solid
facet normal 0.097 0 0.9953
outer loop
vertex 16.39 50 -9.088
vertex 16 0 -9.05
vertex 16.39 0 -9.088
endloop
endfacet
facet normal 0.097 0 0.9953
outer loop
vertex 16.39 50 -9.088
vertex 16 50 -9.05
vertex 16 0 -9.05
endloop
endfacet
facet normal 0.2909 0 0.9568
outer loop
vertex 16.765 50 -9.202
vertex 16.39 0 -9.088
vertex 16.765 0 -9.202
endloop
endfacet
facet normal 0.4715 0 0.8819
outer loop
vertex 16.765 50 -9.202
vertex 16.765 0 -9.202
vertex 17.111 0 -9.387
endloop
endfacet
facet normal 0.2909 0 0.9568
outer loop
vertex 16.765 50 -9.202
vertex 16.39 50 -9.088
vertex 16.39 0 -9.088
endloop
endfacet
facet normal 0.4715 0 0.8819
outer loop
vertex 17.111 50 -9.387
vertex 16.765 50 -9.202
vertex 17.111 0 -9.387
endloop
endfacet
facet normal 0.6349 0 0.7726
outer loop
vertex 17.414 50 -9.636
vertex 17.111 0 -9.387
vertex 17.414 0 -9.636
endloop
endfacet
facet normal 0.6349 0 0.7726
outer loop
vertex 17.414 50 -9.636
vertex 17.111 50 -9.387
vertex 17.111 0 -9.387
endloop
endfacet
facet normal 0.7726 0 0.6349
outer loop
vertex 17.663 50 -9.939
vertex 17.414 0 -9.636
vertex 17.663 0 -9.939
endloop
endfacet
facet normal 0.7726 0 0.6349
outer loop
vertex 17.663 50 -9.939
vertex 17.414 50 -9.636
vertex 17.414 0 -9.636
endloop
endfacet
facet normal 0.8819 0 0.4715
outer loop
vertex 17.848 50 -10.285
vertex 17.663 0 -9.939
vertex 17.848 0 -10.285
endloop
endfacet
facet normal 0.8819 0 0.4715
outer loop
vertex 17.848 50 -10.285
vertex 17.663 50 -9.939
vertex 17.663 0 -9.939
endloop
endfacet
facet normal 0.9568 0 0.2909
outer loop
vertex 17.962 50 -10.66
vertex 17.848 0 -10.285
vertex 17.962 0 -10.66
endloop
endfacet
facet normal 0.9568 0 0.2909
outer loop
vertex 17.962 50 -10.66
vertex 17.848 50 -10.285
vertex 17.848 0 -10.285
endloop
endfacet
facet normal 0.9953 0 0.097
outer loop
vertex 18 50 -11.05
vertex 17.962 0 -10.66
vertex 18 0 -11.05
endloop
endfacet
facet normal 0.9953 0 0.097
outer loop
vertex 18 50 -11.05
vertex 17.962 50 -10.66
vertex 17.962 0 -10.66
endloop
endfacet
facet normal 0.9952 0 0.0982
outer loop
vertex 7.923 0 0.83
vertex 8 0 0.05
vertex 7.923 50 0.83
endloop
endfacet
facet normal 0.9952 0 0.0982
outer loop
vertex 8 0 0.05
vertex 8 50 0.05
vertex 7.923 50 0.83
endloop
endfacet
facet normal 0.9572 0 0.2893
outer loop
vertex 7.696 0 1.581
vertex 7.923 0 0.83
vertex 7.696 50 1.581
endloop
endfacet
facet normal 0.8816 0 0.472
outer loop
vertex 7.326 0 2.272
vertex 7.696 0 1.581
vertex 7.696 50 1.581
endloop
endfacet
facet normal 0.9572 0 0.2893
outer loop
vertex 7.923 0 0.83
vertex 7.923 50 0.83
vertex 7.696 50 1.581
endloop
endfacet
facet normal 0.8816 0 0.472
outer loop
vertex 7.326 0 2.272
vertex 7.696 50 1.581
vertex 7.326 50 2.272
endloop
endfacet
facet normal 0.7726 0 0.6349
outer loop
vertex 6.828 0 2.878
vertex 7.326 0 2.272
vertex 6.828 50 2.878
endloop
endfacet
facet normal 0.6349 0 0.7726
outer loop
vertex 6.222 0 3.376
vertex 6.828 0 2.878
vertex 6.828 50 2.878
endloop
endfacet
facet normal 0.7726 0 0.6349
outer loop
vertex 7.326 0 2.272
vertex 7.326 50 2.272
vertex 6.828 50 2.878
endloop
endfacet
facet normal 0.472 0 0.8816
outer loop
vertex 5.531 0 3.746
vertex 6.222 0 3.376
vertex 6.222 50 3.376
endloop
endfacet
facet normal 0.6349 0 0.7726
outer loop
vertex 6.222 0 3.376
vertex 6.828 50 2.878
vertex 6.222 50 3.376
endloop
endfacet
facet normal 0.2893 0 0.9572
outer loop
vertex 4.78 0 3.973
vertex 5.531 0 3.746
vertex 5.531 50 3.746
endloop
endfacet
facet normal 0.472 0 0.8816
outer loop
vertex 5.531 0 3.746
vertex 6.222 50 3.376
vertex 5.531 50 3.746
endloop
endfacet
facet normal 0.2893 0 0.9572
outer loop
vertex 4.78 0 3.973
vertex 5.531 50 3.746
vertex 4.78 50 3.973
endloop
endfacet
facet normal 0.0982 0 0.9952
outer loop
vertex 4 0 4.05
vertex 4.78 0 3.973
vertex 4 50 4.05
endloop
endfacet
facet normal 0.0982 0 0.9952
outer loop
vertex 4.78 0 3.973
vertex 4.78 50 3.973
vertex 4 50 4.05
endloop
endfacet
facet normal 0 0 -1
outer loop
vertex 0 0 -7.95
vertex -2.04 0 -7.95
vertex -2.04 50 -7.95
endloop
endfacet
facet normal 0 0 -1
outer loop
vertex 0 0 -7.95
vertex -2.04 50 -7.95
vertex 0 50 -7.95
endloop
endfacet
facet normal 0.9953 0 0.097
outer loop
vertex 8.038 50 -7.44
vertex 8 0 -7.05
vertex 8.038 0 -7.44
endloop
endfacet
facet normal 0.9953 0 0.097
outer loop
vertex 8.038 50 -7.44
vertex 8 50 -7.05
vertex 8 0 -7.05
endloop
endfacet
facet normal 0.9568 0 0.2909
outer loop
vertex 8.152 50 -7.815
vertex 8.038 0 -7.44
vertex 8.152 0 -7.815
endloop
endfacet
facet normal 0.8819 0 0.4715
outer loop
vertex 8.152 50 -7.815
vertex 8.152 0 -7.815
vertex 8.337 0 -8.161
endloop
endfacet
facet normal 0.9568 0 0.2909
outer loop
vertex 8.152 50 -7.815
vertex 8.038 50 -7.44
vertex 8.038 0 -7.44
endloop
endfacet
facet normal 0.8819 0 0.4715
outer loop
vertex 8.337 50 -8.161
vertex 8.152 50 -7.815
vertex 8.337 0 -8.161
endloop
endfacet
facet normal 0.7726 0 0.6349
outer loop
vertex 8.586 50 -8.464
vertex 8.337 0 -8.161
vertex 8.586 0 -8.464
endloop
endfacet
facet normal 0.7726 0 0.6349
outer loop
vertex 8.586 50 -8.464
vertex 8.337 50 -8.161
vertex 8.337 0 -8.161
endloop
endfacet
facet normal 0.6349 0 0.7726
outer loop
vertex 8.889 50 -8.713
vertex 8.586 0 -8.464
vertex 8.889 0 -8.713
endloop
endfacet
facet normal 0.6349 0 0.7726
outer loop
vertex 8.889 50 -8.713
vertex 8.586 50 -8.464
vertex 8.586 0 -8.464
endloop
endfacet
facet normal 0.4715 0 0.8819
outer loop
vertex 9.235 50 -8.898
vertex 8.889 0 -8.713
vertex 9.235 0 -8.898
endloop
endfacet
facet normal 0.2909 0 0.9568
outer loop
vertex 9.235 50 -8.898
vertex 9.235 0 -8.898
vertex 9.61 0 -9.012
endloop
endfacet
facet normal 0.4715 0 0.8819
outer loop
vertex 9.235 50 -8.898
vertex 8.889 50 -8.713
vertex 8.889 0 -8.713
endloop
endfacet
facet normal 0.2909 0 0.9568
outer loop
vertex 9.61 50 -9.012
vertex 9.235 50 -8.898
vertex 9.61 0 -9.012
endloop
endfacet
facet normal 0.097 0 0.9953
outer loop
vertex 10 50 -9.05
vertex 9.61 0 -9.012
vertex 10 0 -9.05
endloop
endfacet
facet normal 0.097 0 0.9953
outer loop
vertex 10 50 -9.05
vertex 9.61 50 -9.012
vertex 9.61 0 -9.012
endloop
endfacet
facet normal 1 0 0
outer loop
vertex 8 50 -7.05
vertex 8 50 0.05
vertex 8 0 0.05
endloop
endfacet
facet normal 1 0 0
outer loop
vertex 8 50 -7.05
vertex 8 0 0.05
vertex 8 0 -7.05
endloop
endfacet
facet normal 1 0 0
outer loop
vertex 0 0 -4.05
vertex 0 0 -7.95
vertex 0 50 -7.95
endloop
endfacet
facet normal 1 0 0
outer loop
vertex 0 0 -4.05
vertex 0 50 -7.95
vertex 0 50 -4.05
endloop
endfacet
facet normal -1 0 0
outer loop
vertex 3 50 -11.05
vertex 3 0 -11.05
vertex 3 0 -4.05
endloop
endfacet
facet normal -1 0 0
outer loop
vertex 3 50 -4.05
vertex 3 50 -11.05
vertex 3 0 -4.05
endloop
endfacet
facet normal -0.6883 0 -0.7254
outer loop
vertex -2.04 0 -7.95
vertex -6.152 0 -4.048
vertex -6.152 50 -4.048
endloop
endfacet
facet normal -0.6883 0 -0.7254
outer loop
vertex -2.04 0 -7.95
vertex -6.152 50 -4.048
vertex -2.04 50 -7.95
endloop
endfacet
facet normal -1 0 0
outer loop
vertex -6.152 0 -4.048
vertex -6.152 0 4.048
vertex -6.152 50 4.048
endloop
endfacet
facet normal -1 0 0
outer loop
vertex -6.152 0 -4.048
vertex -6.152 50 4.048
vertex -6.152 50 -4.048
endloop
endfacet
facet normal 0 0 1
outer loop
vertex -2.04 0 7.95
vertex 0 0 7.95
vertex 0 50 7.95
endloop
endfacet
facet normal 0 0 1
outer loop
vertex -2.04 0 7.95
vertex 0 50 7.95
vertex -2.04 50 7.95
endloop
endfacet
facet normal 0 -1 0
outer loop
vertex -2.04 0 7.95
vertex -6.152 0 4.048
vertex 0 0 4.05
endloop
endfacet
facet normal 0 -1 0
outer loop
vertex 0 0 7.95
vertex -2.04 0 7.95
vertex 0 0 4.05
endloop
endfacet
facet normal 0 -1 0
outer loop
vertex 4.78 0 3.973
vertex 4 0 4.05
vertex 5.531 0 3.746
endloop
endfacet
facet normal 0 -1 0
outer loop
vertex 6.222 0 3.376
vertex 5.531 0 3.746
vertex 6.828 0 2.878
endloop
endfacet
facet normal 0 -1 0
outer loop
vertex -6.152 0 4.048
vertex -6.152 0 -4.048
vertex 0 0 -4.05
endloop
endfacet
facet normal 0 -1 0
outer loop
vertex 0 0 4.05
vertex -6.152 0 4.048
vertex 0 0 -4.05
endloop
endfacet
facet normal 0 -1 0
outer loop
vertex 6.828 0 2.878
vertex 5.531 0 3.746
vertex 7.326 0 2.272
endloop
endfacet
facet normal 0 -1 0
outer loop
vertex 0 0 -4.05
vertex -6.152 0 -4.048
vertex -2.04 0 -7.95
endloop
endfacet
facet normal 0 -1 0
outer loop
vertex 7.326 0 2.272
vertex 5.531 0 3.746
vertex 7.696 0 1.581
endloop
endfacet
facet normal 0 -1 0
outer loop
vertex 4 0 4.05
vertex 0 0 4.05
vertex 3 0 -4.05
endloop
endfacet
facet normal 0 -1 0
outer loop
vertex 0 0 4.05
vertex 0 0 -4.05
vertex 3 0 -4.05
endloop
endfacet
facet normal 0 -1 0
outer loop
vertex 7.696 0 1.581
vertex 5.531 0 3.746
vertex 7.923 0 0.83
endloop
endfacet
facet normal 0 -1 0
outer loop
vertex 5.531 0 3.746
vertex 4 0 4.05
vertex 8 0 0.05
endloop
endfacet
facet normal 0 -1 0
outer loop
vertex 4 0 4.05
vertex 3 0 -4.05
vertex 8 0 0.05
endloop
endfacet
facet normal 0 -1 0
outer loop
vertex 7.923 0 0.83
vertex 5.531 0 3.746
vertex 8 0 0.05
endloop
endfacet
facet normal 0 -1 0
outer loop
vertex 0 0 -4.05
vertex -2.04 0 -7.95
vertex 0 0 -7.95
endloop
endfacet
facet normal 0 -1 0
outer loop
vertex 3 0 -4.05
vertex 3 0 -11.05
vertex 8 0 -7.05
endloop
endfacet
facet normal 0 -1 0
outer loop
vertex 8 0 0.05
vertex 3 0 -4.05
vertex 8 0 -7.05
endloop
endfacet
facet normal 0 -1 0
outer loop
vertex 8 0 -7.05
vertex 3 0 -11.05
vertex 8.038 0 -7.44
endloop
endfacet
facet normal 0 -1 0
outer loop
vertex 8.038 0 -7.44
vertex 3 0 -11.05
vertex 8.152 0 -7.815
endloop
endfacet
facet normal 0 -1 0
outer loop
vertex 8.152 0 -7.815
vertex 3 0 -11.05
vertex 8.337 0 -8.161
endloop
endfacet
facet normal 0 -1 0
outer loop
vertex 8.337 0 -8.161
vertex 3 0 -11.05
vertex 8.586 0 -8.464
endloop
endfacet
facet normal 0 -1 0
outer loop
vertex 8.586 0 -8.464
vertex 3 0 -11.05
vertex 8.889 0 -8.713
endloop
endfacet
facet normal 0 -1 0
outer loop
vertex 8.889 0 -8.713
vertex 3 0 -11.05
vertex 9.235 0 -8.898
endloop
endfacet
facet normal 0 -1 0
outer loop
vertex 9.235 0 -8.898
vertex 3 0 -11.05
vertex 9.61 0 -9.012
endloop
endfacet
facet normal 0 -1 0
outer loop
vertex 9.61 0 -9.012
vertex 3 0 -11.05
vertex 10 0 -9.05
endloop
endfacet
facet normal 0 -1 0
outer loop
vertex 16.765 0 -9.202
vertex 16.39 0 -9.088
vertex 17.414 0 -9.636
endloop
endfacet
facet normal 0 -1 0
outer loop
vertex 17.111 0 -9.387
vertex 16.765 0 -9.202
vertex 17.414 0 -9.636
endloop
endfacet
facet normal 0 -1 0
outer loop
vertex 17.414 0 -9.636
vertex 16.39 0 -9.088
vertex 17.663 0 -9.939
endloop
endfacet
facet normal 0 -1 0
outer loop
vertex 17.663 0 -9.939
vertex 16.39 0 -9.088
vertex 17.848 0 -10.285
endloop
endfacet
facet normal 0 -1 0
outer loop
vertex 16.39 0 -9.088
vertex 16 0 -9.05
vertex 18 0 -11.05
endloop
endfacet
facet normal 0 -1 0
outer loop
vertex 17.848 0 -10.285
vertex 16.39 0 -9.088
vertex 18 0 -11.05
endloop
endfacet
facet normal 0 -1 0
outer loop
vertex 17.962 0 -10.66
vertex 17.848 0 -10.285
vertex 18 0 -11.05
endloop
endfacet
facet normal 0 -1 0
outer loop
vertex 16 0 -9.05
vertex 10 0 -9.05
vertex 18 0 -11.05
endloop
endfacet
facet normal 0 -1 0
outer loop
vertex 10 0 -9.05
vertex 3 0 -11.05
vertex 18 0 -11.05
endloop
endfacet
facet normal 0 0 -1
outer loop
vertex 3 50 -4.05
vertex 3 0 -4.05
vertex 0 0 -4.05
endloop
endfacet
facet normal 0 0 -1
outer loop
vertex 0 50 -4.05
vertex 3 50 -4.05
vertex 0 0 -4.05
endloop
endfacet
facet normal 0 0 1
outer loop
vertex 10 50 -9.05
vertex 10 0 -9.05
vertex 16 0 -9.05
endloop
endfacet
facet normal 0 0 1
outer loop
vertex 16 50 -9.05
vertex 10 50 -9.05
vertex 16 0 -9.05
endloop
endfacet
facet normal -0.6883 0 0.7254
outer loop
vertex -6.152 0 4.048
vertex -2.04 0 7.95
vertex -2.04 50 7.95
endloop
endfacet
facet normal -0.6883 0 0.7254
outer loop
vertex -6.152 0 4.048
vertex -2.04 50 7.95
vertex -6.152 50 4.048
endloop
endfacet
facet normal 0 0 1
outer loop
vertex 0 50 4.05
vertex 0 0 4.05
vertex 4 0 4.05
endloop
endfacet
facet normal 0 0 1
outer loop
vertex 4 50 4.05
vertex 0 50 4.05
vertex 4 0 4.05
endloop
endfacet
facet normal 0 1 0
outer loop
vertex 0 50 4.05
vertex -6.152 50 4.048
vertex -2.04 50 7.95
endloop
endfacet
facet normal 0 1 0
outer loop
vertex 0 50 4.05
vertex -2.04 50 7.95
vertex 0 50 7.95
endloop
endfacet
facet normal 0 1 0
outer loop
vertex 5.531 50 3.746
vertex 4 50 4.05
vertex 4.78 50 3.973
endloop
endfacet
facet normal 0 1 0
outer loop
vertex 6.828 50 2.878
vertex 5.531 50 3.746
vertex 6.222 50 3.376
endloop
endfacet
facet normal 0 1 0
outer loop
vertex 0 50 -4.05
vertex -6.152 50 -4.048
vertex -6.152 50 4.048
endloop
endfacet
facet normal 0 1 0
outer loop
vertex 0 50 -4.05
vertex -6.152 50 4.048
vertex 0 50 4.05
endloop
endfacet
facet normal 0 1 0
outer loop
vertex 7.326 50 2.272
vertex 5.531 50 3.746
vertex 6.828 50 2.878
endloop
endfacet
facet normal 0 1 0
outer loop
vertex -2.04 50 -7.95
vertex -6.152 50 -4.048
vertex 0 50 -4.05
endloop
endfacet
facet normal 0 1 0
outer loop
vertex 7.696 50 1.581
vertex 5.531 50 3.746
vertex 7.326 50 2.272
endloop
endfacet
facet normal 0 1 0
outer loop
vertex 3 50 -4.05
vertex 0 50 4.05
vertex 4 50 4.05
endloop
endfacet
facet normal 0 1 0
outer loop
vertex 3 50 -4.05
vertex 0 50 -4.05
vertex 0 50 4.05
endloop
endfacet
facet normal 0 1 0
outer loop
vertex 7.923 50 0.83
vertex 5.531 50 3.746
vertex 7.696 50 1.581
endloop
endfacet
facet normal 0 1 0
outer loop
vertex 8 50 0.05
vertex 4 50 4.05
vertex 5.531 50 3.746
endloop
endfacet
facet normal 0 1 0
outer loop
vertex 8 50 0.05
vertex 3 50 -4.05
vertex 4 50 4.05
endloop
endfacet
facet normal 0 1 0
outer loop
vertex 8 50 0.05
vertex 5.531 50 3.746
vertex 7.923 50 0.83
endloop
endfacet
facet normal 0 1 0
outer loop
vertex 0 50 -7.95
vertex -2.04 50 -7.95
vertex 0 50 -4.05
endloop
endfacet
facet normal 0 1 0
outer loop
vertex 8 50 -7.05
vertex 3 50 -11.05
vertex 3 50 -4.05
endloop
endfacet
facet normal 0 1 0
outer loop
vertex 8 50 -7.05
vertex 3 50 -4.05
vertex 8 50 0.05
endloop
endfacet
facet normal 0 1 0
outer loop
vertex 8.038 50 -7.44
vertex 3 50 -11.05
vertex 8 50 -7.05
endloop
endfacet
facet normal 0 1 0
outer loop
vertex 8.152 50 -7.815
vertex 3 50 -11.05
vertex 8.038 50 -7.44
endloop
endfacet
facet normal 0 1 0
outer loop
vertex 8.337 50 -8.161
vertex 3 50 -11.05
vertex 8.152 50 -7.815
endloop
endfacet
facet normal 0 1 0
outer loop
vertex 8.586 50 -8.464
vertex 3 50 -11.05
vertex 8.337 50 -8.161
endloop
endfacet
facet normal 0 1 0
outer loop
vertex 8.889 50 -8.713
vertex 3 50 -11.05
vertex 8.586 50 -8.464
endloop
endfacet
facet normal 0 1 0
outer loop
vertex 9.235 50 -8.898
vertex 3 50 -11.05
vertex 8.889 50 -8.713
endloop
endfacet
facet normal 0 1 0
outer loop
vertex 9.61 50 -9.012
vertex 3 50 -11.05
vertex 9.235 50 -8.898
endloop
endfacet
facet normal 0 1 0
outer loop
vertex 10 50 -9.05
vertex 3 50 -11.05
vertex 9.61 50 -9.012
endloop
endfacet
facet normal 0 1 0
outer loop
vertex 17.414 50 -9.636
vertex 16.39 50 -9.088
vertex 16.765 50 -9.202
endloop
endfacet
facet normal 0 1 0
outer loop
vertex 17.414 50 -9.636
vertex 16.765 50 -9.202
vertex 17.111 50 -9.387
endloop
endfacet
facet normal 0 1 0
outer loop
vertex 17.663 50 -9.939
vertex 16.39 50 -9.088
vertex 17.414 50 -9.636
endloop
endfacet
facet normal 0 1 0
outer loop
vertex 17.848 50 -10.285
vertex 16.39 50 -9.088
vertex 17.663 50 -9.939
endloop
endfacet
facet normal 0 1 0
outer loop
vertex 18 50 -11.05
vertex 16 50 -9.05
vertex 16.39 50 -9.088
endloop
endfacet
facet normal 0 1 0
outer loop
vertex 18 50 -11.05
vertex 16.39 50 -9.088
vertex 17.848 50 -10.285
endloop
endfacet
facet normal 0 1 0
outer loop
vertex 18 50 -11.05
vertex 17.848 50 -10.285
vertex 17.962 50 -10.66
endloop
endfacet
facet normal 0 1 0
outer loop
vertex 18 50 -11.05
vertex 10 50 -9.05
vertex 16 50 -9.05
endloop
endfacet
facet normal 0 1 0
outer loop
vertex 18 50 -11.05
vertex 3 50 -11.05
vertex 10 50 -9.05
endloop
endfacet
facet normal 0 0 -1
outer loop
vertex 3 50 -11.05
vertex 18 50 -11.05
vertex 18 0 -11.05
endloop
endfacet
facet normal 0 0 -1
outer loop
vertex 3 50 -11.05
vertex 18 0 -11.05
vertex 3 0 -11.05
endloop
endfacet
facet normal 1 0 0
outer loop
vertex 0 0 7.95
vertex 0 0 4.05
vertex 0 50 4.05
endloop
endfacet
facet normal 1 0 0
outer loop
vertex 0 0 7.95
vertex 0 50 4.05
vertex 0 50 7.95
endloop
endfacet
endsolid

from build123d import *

# Parameters (mm, degrees)
SKETCH1_W           = 10
SKETCH1_H           = 2
BOSS_EXTRUDE1_DEPTH = 50
FILLET1_R           = 2
FILLET2_R           = 4
FILLET3_R           = 2


with BuildPart() as part:
    # Sketch1 → Boss-Extrude1 (new body)
    with BuildSketch(Plane(origin=(0, 0, 0), x_dir=(1, 0, 0), z_dir=(0, 1, 0))):
        Polygon((3, 4.05), (0, 4.05), (0, -4.05), (8, -4.05), (8, 4.05), align=None)
        Polygon((3, 11.05), (3, 4.05), (8, 4.05), (8, 9.05), (8, 11.05), align=None)
        Polygon((-2.04, 7.95), (0, 7.95), (0, -7.95), (-2.04, -7.95), (-6.152414984, -4.048), (-6.152414984, 4.048), align=None)
        with Locations((13, 10.05)):
            Rectangle(SKETCH1_W, SKETCH1_H)
    extrude(amount=BOSS_EXTRUDE1_DEPTH)

    # Fillet1
    fillet1_edges = [part.edges().sort_by_distance(p)[0] for p in [
        (8, 25, -9.05),
    ]]
    fillet(fillet1_edges, radius=FILLET1_R)

    # Fillet2
    fillet2_edges = [part.edges().sort_by_distance(p)[0] for p in [
        (8, 25, 4.05),
    ]]
    fillet(fillet2_edges, radius=FILLET2_R)

    # Fillet3
    fillet3_edges = [part.edges().sort_by_distance(p)[0] for p in [
        (18, 25, -9.05),
    ]]
    fillet(fillet3_edges, radius=FILLET3_R - 0.0001)  # a hair under: the kernel refuses the full size


solid = part.part
